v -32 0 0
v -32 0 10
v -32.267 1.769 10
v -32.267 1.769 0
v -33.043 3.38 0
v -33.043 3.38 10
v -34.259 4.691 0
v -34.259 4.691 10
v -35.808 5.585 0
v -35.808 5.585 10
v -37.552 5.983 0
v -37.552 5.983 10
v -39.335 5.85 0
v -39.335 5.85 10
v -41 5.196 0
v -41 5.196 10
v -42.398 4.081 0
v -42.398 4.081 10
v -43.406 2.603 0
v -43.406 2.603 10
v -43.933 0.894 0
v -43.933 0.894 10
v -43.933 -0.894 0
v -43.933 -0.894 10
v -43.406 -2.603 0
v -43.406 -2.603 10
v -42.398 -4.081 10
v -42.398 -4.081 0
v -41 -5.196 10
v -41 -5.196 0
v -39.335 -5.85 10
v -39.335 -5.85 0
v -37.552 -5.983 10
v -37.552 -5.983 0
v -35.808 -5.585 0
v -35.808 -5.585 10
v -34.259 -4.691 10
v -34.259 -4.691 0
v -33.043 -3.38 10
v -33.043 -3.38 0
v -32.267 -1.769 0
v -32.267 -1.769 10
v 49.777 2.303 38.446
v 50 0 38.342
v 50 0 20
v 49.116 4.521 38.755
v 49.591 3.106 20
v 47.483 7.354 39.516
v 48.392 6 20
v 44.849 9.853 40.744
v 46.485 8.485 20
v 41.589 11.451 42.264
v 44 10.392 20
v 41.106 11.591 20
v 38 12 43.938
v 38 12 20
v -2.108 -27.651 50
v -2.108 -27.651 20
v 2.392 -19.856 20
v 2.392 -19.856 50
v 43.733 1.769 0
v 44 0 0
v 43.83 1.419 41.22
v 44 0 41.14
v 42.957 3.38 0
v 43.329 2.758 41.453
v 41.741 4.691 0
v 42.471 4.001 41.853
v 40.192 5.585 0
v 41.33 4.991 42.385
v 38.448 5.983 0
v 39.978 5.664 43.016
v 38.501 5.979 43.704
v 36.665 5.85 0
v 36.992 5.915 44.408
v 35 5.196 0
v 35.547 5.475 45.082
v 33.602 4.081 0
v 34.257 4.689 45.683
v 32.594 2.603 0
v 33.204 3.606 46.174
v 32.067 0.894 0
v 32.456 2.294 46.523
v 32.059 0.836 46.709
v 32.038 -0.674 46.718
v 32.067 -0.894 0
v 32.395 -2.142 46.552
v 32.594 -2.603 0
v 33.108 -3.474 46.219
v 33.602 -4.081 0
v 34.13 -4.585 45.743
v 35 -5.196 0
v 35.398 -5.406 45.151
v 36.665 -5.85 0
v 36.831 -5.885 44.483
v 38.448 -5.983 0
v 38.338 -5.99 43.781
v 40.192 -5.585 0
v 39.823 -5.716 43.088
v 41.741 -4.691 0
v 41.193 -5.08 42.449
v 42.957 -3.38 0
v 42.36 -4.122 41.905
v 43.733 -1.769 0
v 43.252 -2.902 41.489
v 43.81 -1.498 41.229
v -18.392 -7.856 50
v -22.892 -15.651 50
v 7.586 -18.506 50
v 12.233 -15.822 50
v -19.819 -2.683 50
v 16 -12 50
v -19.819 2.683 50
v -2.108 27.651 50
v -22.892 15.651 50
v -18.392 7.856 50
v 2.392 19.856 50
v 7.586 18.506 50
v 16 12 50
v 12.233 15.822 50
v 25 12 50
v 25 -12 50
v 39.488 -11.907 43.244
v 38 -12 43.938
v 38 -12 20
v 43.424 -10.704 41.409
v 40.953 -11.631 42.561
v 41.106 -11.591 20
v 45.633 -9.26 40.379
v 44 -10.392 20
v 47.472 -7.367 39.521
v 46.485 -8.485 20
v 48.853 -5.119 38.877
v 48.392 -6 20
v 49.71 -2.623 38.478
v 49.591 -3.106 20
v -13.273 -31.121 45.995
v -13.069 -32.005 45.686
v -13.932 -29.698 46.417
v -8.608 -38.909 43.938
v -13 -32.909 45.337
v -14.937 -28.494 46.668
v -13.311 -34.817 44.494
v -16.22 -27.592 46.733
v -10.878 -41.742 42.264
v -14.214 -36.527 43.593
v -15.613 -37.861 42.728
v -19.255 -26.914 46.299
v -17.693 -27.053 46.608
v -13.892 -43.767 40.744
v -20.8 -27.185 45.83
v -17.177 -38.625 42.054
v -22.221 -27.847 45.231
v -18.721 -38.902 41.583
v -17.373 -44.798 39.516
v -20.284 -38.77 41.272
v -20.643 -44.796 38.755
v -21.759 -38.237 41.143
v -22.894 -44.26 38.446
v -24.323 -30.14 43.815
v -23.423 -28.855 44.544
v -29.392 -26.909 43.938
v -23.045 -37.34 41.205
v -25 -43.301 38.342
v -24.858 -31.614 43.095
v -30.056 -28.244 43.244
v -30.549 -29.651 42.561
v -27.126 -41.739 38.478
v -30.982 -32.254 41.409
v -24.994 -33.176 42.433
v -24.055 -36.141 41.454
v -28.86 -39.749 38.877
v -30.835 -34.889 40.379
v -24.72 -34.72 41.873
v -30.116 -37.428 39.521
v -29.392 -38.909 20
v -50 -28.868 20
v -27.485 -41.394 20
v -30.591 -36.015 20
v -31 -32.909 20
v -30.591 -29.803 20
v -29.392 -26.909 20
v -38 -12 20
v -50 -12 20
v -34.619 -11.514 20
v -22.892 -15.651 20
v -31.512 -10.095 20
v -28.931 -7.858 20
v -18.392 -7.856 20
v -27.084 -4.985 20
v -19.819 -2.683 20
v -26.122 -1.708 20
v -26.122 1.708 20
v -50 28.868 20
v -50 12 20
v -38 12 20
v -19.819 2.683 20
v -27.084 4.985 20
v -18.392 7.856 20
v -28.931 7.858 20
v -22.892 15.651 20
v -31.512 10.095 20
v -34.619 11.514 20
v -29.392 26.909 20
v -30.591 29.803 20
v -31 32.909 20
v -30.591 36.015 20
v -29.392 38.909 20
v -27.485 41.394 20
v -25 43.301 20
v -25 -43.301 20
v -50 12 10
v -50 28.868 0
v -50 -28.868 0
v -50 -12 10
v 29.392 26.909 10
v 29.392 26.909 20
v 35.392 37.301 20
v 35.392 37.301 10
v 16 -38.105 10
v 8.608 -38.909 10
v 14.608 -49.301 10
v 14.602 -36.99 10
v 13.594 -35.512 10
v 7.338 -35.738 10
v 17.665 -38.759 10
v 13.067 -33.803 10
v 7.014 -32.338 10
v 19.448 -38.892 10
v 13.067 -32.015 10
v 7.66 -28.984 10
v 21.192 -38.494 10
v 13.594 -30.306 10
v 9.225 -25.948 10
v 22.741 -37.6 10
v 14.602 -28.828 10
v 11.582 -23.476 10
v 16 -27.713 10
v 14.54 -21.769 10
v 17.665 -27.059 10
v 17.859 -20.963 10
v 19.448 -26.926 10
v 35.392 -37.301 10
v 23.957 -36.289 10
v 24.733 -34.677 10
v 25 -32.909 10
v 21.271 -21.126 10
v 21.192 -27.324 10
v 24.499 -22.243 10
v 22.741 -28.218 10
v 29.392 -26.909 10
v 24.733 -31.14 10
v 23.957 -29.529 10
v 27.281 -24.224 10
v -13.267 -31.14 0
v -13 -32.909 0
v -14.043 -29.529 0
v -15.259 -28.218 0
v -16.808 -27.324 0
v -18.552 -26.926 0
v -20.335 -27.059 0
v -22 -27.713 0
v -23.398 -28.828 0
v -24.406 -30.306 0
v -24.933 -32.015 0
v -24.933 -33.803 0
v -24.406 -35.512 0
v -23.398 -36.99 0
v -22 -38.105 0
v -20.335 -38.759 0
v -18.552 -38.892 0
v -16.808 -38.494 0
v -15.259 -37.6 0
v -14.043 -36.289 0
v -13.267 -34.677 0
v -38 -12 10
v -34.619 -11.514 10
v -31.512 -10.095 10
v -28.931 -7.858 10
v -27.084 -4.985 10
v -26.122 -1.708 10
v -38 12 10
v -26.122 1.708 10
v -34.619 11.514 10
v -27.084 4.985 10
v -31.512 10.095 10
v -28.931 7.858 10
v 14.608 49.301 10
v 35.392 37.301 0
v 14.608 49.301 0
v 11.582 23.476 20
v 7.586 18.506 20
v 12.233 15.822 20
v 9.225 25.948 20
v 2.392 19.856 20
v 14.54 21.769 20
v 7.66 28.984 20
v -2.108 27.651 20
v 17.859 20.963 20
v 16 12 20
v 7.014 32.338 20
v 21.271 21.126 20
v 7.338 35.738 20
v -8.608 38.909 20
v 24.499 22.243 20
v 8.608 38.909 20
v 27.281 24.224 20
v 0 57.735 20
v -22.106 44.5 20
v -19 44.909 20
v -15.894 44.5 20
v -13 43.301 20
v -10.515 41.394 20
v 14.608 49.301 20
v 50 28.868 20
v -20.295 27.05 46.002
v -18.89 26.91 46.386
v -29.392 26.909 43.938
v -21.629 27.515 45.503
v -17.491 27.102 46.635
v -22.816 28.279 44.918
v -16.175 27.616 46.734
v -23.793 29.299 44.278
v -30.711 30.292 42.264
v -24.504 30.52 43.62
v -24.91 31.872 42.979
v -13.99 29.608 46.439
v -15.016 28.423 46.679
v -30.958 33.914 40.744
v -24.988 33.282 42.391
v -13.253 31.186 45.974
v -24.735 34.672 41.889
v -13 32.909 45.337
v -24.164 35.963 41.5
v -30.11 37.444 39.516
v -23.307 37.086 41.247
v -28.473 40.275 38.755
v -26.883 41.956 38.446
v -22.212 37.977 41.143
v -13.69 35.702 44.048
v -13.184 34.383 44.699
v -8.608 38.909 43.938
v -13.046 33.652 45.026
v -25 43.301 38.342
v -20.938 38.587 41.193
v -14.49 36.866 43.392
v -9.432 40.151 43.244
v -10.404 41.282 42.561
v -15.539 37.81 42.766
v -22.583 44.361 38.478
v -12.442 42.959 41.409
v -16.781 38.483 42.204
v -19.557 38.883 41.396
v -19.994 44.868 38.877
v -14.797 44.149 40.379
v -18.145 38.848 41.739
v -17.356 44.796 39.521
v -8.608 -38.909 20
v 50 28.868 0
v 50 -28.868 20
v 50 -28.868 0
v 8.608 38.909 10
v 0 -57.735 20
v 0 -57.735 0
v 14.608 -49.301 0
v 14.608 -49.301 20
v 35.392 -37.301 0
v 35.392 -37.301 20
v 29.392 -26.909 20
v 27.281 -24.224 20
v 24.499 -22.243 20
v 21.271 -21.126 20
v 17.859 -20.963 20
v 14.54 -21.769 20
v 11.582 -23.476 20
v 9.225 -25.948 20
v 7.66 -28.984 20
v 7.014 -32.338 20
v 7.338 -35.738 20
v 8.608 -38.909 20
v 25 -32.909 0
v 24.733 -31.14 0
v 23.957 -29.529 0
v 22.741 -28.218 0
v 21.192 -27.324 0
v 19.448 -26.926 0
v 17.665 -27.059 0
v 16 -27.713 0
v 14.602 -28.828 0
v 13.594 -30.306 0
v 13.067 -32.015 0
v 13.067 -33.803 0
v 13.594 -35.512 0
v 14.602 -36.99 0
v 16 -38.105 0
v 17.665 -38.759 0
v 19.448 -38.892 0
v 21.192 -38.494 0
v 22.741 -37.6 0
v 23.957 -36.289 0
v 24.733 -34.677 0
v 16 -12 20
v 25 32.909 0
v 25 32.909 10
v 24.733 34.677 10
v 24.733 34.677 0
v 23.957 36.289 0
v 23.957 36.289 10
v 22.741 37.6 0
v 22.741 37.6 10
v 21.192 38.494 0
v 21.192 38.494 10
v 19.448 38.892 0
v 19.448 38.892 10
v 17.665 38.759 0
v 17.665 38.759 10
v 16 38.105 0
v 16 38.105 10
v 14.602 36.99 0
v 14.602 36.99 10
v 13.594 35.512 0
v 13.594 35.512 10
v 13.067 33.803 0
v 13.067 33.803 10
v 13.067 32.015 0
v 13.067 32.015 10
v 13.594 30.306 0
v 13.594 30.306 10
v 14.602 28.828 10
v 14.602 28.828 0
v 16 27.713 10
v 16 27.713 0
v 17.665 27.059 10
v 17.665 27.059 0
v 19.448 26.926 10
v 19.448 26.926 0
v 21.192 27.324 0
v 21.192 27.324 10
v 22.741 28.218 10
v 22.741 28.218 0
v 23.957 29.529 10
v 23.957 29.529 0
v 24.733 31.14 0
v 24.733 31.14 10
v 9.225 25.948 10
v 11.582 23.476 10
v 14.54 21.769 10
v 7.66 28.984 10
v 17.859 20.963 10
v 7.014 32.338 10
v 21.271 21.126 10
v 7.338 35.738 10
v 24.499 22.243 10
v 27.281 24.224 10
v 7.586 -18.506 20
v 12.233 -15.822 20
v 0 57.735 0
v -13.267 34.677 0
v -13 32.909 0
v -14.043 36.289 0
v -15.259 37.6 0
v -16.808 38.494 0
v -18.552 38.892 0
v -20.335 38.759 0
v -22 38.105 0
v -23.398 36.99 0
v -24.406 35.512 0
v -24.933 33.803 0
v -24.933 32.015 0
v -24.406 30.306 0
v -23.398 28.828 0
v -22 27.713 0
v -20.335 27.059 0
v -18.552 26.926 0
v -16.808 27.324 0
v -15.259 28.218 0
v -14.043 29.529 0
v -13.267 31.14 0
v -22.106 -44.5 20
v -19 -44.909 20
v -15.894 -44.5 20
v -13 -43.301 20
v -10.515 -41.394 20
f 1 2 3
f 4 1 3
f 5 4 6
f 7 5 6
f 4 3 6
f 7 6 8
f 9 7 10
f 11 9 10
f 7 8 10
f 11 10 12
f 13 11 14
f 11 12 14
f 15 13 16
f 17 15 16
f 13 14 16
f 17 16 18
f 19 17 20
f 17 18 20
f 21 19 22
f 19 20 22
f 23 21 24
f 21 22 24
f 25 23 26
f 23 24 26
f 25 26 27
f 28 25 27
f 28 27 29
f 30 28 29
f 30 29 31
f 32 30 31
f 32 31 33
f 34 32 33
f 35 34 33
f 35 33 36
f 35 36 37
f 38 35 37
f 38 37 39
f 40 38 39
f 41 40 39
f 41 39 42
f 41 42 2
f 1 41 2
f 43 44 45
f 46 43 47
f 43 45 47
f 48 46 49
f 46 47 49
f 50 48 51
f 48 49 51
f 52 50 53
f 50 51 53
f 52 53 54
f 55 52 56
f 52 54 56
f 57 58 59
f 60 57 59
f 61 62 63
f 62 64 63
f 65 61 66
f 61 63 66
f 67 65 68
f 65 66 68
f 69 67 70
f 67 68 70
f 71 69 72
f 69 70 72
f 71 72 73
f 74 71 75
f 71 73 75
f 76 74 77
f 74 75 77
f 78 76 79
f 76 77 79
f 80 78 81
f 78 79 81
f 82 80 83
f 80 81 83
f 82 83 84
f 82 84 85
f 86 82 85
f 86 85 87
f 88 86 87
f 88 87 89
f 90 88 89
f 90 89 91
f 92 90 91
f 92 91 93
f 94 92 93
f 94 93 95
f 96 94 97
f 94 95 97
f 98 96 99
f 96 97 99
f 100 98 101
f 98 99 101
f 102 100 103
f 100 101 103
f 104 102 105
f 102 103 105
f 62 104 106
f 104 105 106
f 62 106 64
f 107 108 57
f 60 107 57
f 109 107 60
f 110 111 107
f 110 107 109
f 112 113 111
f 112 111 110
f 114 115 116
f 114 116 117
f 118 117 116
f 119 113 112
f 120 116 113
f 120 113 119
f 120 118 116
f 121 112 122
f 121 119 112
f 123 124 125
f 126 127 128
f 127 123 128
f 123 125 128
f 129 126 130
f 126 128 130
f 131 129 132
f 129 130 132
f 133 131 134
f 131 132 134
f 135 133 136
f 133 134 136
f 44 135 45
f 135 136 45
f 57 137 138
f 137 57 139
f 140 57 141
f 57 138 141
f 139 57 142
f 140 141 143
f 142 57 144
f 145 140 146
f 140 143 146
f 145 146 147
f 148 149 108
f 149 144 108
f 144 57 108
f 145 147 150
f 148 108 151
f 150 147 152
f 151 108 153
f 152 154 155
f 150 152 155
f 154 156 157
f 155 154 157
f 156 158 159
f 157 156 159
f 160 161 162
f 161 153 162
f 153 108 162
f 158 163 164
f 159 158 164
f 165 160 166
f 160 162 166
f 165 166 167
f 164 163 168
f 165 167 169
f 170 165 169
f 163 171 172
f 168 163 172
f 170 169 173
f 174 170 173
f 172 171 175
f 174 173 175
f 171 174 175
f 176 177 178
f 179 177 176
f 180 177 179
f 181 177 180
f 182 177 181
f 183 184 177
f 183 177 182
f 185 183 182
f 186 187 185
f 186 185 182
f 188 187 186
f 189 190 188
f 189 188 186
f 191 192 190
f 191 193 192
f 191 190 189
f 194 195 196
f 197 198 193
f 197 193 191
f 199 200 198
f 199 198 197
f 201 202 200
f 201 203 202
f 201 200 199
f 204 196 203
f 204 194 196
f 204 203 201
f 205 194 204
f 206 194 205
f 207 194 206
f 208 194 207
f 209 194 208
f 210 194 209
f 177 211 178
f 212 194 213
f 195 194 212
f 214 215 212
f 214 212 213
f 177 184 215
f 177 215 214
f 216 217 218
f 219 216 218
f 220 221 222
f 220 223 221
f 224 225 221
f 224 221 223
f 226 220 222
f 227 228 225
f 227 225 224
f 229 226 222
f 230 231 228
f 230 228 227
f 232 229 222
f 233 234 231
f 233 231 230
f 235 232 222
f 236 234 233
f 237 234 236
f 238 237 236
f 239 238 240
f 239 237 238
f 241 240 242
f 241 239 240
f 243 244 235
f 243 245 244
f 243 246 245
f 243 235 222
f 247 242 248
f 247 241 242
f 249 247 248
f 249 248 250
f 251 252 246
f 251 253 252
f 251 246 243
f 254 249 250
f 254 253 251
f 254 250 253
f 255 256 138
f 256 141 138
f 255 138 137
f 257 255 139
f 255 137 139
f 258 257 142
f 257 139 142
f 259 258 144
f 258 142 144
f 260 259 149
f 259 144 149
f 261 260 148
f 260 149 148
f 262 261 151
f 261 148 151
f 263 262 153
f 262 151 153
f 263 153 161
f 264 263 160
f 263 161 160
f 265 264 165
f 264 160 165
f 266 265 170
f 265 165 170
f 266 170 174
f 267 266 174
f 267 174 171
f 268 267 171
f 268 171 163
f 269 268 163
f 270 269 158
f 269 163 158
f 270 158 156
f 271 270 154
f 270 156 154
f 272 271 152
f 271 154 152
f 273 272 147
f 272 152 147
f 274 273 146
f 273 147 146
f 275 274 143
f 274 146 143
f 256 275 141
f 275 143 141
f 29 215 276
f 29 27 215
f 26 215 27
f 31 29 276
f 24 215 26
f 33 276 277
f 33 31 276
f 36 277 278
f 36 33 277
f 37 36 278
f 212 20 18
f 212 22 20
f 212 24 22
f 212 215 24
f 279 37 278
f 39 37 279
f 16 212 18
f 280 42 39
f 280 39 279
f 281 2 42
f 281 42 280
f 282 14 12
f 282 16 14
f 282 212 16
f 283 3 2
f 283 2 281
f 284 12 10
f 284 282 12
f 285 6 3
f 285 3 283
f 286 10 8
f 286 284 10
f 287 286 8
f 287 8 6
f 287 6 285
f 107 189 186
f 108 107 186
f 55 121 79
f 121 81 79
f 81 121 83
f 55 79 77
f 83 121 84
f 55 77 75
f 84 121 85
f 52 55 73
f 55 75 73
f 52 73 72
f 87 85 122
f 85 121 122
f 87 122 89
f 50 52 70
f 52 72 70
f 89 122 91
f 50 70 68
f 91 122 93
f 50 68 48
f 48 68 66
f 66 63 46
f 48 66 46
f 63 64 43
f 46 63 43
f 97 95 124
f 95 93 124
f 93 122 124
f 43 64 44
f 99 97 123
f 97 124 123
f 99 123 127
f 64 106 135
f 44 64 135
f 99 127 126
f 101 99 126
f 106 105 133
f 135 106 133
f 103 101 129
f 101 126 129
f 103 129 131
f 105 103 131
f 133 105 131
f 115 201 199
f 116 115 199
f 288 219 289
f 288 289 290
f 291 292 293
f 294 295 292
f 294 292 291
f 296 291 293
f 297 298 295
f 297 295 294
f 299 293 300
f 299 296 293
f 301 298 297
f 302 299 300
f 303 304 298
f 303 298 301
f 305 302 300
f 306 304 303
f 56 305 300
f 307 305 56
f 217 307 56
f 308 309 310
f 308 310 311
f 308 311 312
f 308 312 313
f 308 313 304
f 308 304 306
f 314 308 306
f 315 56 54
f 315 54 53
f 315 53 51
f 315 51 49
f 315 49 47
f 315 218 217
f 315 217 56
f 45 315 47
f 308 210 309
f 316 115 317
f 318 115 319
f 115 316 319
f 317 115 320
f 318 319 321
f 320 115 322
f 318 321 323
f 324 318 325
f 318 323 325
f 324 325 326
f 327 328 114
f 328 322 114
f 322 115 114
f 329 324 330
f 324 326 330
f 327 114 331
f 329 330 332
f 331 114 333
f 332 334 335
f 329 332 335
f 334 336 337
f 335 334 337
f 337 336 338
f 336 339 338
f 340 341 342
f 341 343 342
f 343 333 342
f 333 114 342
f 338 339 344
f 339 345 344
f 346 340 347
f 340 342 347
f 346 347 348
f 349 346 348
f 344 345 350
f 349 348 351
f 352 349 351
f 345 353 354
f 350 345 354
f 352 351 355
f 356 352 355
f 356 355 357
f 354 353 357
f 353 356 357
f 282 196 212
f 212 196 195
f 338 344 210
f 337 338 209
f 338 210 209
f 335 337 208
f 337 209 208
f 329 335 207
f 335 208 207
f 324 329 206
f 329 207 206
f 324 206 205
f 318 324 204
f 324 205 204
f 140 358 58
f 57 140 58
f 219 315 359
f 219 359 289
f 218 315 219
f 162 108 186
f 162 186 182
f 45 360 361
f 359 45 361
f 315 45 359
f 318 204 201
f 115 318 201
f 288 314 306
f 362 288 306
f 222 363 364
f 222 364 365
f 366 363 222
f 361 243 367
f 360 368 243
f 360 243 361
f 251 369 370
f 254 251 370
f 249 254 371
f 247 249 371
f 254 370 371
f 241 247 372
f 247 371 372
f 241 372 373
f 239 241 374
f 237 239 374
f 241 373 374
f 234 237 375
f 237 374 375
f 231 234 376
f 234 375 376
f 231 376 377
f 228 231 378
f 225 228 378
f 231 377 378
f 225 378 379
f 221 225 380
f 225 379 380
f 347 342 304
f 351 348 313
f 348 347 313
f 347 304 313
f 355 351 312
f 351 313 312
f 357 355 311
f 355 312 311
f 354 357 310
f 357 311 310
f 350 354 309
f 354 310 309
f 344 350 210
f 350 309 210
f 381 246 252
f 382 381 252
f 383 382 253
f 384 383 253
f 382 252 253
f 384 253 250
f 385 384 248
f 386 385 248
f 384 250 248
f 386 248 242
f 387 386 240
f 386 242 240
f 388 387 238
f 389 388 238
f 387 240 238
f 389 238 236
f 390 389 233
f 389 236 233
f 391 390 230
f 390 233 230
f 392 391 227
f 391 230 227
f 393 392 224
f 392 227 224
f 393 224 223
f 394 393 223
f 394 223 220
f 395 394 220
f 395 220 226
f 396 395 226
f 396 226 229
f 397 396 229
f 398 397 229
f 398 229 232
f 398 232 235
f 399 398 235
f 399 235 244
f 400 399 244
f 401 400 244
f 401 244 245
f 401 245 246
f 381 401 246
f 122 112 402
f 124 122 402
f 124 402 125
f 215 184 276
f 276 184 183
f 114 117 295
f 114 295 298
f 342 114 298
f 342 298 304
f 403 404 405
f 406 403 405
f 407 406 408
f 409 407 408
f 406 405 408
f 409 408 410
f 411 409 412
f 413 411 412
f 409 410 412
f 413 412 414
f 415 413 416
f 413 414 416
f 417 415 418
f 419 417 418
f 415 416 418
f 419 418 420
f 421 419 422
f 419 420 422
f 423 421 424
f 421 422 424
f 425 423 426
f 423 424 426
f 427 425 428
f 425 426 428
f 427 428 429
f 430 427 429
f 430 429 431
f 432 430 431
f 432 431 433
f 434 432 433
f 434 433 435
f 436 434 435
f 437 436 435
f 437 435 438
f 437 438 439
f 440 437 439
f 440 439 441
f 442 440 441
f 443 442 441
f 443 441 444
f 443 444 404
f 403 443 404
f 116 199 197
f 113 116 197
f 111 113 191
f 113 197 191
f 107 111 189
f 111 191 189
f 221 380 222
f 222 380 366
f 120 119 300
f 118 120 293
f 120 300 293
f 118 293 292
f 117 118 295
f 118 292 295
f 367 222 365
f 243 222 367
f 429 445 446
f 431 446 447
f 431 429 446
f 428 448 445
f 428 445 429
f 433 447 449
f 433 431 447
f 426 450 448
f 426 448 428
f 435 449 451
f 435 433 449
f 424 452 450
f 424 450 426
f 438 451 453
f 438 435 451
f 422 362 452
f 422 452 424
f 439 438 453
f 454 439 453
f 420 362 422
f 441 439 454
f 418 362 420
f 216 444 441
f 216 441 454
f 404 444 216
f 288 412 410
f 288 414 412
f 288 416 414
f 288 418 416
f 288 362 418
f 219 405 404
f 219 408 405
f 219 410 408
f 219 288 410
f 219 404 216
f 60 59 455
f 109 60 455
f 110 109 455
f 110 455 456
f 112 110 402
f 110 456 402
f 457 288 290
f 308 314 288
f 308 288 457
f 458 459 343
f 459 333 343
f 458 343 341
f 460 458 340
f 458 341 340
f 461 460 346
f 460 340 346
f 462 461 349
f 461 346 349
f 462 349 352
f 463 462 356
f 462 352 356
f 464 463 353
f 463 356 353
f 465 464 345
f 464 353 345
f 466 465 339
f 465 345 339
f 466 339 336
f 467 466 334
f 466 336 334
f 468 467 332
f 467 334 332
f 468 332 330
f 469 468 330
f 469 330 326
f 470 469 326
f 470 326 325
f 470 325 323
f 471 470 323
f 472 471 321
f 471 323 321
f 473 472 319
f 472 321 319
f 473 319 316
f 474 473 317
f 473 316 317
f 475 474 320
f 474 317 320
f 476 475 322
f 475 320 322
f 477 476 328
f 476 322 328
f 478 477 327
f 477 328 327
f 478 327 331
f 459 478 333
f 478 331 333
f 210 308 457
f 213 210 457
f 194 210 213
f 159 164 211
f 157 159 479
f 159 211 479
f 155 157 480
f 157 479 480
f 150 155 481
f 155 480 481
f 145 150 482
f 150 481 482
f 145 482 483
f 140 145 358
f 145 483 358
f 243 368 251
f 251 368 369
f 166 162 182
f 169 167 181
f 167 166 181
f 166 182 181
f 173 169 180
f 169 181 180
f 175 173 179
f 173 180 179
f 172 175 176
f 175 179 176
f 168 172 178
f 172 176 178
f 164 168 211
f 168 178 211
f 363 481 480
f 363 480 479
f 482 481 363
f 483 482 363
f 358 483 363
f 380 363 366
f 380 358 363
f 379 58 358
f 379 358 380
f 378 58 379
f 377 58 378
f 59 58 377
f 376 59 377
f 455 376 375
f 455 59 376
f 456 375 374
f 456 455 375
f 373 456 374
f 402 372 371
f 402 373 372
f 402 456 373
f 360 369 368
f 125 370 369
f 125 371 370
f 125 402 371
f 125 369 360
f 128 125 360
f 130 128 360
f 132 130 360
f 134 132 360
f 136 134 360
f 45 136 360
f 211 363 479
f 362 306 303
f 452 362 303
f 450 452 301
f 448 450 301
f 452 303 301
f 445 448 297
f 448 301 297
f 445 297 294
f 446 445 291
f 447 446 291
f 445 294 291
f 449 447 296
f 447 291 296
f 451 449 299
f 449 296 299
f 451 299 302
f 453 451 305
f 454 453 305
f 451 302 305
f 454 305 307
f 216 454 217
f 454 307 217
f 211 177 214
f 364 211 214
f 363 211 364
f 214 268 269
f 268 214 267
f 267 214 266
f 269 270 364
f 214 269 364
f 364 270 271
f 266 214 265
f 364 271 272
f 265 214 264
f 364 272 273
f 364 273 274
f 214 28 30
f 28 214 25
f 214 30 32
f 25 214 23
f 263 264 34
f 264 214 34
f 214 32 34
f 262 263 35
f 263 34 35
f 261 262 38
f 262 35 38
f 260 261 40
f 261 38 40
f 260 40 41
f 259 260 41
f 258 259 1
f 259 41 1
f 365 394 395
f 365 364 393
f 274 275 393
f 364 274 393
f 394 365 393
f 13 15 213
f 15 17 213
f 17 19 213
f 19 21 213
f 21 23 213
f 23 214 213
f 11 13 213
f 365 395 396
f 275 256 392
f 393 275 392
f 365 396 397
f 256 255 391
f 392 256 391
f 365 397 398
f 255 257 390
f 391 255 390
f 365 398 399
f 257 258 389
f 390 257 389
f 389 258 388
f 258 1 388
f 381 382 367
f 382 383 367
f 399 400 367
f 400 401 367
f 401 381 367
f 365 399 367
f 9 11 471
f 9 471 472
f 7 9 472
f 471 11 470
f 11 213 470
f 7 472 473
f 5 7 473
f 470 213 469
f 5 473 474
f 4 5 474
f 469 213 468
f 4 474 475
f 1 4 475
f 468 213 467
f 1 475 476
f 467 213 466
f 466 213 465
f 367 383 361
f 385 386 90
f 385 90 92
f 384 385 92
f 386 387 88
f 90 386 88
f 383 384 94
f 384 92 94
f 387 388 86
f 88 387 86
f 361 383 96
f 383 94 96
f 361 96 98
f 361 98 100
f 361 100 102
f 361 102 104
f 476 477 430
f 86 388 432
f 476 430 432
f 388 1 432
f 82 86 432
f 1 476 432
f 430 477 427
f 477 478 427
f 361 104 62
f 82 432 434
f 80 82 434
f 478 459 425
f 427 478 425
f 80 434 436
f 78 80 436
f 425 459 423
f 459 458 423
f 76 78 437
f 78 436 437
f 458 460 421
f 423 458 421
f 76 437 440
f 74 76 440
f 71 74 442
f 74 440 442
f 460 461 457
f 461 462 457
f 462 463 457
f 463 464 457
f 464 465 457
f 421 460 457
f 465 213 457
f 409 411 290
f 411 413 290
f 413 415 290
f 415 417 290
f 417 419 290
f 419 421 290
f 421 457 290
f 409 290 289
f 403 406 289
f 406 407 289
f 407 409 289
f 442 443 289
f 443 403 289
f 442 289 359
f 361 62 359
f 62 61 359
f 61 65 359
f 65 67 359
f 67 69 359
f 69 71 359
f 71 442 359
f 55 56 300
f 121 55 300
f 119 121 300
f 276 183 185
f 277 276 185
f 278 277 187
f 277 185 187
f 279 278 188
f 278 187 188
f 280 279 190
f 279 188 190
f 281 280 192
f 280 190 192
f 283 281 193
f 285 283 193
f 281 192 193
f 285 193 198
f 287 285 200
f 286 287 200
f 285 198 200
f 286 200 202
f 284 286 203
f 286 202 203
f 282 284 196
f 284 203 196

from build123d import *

# Parameters (mm, degrees)
F1_R            = 6
F2_DEPTH        = 20
F3_DEPTH        = 30
F3_DEPTH_BACK   = 20
F4_DEPTH        = 10
F6_DEPTH        = 12.5
F6_COPIES_COUNT = 3


# Not quite as in the source:
# - a pattern or mirror of a feature is missing from the dataset's text; its kind, count and spacing are read off the source's solid


with BuildPart() as f2:
    # F1 (on offset) → F2 (new body, through all)
    with BuildSketch(Plane.XY.offset(20)):
        with BuildLine():
            ThreePointArc((-29.3923048454, 26.9089653438), (-30.5911098969, 36.0147939544), (-24.9999998757, 43.301270261))
            Line((-24.9999998757, 43.301270261), (-50, 28.8675134595))
            Line((-50, 28.8675134595), (-50, 12))
            Line((-50, 12), (-38, 12))
            ThreePointArc((-38, 12), (-26, 0), (-38, -12))
            Line((-38, -12), (-50, -12))
            Line((-50, -12), (-50, -28.8675134595))
            Line((-50, -28.8675134595), (-24.9999998757, -43.301270261))
            ThreePointArc((-24.9999998757, -43.301270261), (-30.5911098969, -36.0147939544), (-29.3923048454, -26.9089653438))
            Line((-29.3923048454, -26.9089653438), (-22.8923048454, -15.6506350946))
            Line((-22.8923048454, -15.6506350946), (-18.3923048454, -7.8564064606))
            ThreePointArc((-18.3923048454, -7.8564064606), (-20, 0), (-18.3923048454, 7.8564064606))
            Line((-18.3923048454, 7.8564064606), (-22.8923048454, 15.6506350946))
            Line((-22.8923048454, 15.6506350946), (-29.3923048454, 26.9089653438))
        make_face()
        with BuildLine():
            Line((-38, 12), (-50, 12))
            Line((-50, 12), (-50, -12))
            Line((-50, -12), (-38, -12))
            ThreePointArc((-38, -12), (-26, 0), (-38, 12))
        make_face()
        with Locations((-38, 0)):
            Circle(F1_R, mode=Mode.SUBTRACT)
    extrude(amount=-F2_DEPTH)



with BuildPart() as f2b:
    # F1 (on offset) → F2, piece 2 (new body, through all)
    with BuildSketch(Plane.XY.offset(20)):
        with BuildLine():
            Line((50, -28.8675134595), (50, 0))
            ThreePointArc((50, 0), (46.4852813742, -8.4852813742), (38, -12))
            Line((38, -12), (25, -12))
            Line((25, -12), (16, -12))
            ThreePointArc((16, -12), (10, -17.3205080757), (2.3923048454, -19.8564064606))
            Line((2.3923048454, -19.8564064606), (-2.1076951546, -27.6506350946))
            Line((-2.1076951546, -27.6506350946), (-8.6076951546, -38.9089653438))
            ThreePointArc((-8.6076951546, -38.9089653438), (-15.8941713895, -44.5000752407), (-24.9999998757, -43.301270261))
            Line((-24.9999998757, -43.301270261), (0, -57.735026919))
            Line((0, -57.735026919), (14.6076951546, -49.3012701892))
            Line((14.6076951546, -49.3012701892), (8.6076951546, -38.9089653438))
            ThreePointArc((8.6076951546, -38.9089653438), (13, -22.5166604984), (29.3923048454, -26.9089653438))
            Line((29.3923048454, -26.9089653438), (35.3923048454, -37.3012701892))
            Line((35.3923048454, -37.3012701892), (50, -28.8675134595))
        make_face()
        with BuildLine():
            Line((14.6076951546, -49.3012701892), (35.3923048454, -37.3012701892))
            Line((35.3923048454, -37.3012701892), (29.3923048454, -26.9089653438))
            ThreePointArc((29.3923048454, -26.9089653438), (13, -22.5166604984), (8.6076951546, -38.9089653438))
            Line((8.6076951546, -38.9089653438), (14.6076951546, -49.3012701892))
        make_face()
        with Locations((19, -32.9089653438)):
            Circle(F1_R, mode=Mode.SUBTRACT)
    extrude(amount=-F2_DEPTH)


with BuildPart() as f2c:
    # F1 (on offset) → F2, piece 3 (new body, through all)
    with BuildSketch(Plane.XY.offset(20)):
        with BuildLine():
            Line((50, 0), (50, 28.8675134595))
            Line((50, 28.8675134595), (35.3923048454, 37.3012701892))
            Line((35.3923048454, 37.3012701892), (29.3923048454, 26.9089653438))
            ThreePointArc((29.3923048454, 26.9089653438), (13, 22.5166604984), (8.6076951546, 38.9089653438))
            Line((8.6076951546, 38.9089653438), (14.6076951546, 49.3012701892))
            Line((14.6076951546, 49.3012701892), (0, 57.735026919))
            Line((0, 57.735026919), (-24.9999998757, 43.301270261))
            ThreePointArc((-24.9999998757, 43.301270261), (-15.8941713895, 44.5000752407), (-8.6076951546, 38.9089653438))
            Line((-8.6076951546, 38.9089653438), (-2.1076951546, 27.6506350946))
            Line((-2.1076951546, 27.6506350946), (2.3923048454, 19.8564064606))
            ThreePointArc((2.3923048454, 19.8564064606), (10, 17.3205080757), (16, 12))
            Line((16, 12), (25, 12))
            Line((25, 12), (38, 12))
            ThreePointArc((38, 12), (46.4852813742, 8.4852813742), (50, 0))
        make_face()
        with BuildLine():
            Line((29.3923048454, 26.9089653438), (35.3923048454, 37.3012701892))
            Line((35.3923048454, 37.3012701892), (14.6076951546, 49.3012701892))
            Line((14.6076951546, 49.3012701892), (8.6076951546, 38.9089653438))
            ThreePointArc((8.6076951546, 38.9089653438), (13, 22.5166604984), (29.3923048454, 26.9089653438))
        make_face()
        with Locations((19, 32.9089653438)):
            Circle(F1_R, mode=Mode.SUBTRACT)
    extrude(amount=-F2_DEPTH)


with BuildPart() as f2_1:
    add(f2.part)

    add(f2b.part)  # F3 merges F2b

    add(f2c.part)  # F3 merges F2c
    # F1 (on offset) → F3 (join, two sides)
    with BuildSketch(Plane.XY.offset(20)) as f3_sk:
        with BuildLine():
            ThreePointArc((-8.6076951546, 38.9089653438), (-15.8941713895, 44.5000752407), (-24.9999998757, 43.301270261))
            ThreePointArc((-24.9999998757, 43.301270261), (-30.5911098969, 36.0147939544), (-29.3923048454, 26.9089653438))
            Line((-29.3923048454, 26.9089653438), (-22.8923048454, 15.6506350946))
            Line((-22.8923048454, 15.6506350946), (-2.1076951546, 27.6506350946))
            Line((-2.1076951546, 27.6506350946), (-8.6076951546, 38.9089653438))
        make_face()
        with Locations((-19, 32.9089653438)):
            Circle(F1_R, mode=Mode.SUBTRACT)
        with BuildLine():
            Line((16, -12), (25, -12))
            Line((25, -12), (25, 12))
            Line((25, 12), (16, 12))
            ThreePointArc((16, 12), (10, 17.3205080757), (2.3923048454, 19.8564064606))
            Line((2.3923048454, 19.8564064606), (-2.1076951546, 27.6506350946))
            Line((-2.1076951546, 27.6506350946), (-22.8923048454, 15.6506350946))
            Line((-22.8923048454, 15.6506350946), (-18.3923048454, 7.8564064606))
            ThreePointArc((-18.3923048454, 7.8564064606), (-20, 0), (-18.3923048454, -7.8564064606))
            Line((-18.3923048454, -7.8564064606), (-22.8923048454, -15.6506350946))
            Line((-22.8923048454, -15.6506350946), (-2.1076951546, -27.6506350946))
            Line((-2.1076951546, -27.6506350946), (2.3923048454, -19.8564064606))
            ThreePointArc((2.3923048454, -19.8564064606), (10, -17.3205080757), (16, -12))
        make_face()
        with BuildLine():
            ThreePointArc((38, -12), (46.4852813742, -8.4852813742), (50, 0))
            ThreePointArc((50, 0), (46.4852813742, 8.4852813742), (38, 12))
            Line((38, 12), (25, 12))
            Line((25, 12), (25, -12))
            Line((25, -12), (38, -12))
        make_face()
        with Locations((38, 0)):
            Circle(F1_R, mode=Mode.SUBTRACT)
        with BuildLine():
            ThreePointArc((-29.3923048454, -26.9089653438), (-30.5911098969, -36.0147939544), (-24.9999998757, -43.301270261))
            ThreePointArc((-24.9999998757, -43.301270261), (-15.8941713895, -44.5000752407), (-8.6076951546, -38.9089653438))
            Line((-8.6076951546, -38.9089653438), (-2.1076951546, -27.6506350946))
            Line((-2.1076951546, -27.6506350946), (-22.8923048454, -15.6506350946))
            Line((-22.8923048454, -15.6506350946), (-29.3923048454, -26.9089653438))
        make_face()
        with Locations((-19, -32.9089653438)):
            Circle(F1_R, mode=Mode.SUBTRACT)
    extrude(amount=F3_DEPTH)
    extrude(f3_sk.sketch, amount=-F3_DEPTH_BACK)

    # F1 (on offset) → F4 (cut)
    with BuildSketch(Plane.XY.offset(20)):
        with BuildLine():
            Line((-38, 12), (-50, 12))
            Line((-50, 12), (-50, -12))
            Line((-50, -12), (-38, -12))
            ThreePointArc((-38, -12), (-26, 0), (-38, 12))
        make_face()
        with Locations((-38, 0)):
            Circle(F1_R, mode=Mode.SUBTRACT)
        with BuildLine():
            Line((14.6076951546, -49.3012701892), (35.3923048454, -37.3012701892))
            Line((35.3923048454, -37.3012701892), (29.3923048454, -26.9089653438))
            ThreePointArc((29.3923048454, -26.9089653438), (13, -22.5166604984), (8.6076951546, -38.9089653438))
            Line((8.6076951546, -38.9089653438), (14.6076951546, -49.3012701892))
        make_face()
        with Locations((19, -32.9089653438)):
            Circle(F1_R, mode=Mode.SUBTRACT)
        with BuildLine():
            Line((29.3923048454, 26.9089653438), (35.3923048454, 37.3012701892))
            Line((35.3923048454, 37.3012701892), (14.6076951546, 49.3012701892))
            Line((14.6076951546, 49.3012701892), (8.6076951546, 38.9089653438))
            ThreePointArc((8.6076951546, 38.9089653438), (13, 22.5166604984), (29.3923048454, 26.9089653438))
        make_face()
        with Locations((19, 32.9089653438)):
            Circle(F1_R, mode=Mode.SUBTRACT)
    extrude(amount=-F4_DEPTH, mode=Mode.SUBTRACT)

    # F5 (on Front) → F6 (cut, symmetric)
    with BuildSketch(Plane.XZ):
        Polygon((50, 50), (25, 50), (50, 38.3423085461), align=None)
    f6 = extrude(amount=F6_DEPTH, both=True, mode=Mode.SUBTRACT)

    # F6_copies: F6 ×3 about axis
    f6_copies_axis = Axis((0, 0, 0), (0, 0, 1))
    for i in range(1, F6_COPIES_COUNT):
        add(f6.rotate(f6_copies_axis, i * 360 / F6_COPIES_COUNT), mode=Mode.SUBTRACT)


solid = f2_1.part
